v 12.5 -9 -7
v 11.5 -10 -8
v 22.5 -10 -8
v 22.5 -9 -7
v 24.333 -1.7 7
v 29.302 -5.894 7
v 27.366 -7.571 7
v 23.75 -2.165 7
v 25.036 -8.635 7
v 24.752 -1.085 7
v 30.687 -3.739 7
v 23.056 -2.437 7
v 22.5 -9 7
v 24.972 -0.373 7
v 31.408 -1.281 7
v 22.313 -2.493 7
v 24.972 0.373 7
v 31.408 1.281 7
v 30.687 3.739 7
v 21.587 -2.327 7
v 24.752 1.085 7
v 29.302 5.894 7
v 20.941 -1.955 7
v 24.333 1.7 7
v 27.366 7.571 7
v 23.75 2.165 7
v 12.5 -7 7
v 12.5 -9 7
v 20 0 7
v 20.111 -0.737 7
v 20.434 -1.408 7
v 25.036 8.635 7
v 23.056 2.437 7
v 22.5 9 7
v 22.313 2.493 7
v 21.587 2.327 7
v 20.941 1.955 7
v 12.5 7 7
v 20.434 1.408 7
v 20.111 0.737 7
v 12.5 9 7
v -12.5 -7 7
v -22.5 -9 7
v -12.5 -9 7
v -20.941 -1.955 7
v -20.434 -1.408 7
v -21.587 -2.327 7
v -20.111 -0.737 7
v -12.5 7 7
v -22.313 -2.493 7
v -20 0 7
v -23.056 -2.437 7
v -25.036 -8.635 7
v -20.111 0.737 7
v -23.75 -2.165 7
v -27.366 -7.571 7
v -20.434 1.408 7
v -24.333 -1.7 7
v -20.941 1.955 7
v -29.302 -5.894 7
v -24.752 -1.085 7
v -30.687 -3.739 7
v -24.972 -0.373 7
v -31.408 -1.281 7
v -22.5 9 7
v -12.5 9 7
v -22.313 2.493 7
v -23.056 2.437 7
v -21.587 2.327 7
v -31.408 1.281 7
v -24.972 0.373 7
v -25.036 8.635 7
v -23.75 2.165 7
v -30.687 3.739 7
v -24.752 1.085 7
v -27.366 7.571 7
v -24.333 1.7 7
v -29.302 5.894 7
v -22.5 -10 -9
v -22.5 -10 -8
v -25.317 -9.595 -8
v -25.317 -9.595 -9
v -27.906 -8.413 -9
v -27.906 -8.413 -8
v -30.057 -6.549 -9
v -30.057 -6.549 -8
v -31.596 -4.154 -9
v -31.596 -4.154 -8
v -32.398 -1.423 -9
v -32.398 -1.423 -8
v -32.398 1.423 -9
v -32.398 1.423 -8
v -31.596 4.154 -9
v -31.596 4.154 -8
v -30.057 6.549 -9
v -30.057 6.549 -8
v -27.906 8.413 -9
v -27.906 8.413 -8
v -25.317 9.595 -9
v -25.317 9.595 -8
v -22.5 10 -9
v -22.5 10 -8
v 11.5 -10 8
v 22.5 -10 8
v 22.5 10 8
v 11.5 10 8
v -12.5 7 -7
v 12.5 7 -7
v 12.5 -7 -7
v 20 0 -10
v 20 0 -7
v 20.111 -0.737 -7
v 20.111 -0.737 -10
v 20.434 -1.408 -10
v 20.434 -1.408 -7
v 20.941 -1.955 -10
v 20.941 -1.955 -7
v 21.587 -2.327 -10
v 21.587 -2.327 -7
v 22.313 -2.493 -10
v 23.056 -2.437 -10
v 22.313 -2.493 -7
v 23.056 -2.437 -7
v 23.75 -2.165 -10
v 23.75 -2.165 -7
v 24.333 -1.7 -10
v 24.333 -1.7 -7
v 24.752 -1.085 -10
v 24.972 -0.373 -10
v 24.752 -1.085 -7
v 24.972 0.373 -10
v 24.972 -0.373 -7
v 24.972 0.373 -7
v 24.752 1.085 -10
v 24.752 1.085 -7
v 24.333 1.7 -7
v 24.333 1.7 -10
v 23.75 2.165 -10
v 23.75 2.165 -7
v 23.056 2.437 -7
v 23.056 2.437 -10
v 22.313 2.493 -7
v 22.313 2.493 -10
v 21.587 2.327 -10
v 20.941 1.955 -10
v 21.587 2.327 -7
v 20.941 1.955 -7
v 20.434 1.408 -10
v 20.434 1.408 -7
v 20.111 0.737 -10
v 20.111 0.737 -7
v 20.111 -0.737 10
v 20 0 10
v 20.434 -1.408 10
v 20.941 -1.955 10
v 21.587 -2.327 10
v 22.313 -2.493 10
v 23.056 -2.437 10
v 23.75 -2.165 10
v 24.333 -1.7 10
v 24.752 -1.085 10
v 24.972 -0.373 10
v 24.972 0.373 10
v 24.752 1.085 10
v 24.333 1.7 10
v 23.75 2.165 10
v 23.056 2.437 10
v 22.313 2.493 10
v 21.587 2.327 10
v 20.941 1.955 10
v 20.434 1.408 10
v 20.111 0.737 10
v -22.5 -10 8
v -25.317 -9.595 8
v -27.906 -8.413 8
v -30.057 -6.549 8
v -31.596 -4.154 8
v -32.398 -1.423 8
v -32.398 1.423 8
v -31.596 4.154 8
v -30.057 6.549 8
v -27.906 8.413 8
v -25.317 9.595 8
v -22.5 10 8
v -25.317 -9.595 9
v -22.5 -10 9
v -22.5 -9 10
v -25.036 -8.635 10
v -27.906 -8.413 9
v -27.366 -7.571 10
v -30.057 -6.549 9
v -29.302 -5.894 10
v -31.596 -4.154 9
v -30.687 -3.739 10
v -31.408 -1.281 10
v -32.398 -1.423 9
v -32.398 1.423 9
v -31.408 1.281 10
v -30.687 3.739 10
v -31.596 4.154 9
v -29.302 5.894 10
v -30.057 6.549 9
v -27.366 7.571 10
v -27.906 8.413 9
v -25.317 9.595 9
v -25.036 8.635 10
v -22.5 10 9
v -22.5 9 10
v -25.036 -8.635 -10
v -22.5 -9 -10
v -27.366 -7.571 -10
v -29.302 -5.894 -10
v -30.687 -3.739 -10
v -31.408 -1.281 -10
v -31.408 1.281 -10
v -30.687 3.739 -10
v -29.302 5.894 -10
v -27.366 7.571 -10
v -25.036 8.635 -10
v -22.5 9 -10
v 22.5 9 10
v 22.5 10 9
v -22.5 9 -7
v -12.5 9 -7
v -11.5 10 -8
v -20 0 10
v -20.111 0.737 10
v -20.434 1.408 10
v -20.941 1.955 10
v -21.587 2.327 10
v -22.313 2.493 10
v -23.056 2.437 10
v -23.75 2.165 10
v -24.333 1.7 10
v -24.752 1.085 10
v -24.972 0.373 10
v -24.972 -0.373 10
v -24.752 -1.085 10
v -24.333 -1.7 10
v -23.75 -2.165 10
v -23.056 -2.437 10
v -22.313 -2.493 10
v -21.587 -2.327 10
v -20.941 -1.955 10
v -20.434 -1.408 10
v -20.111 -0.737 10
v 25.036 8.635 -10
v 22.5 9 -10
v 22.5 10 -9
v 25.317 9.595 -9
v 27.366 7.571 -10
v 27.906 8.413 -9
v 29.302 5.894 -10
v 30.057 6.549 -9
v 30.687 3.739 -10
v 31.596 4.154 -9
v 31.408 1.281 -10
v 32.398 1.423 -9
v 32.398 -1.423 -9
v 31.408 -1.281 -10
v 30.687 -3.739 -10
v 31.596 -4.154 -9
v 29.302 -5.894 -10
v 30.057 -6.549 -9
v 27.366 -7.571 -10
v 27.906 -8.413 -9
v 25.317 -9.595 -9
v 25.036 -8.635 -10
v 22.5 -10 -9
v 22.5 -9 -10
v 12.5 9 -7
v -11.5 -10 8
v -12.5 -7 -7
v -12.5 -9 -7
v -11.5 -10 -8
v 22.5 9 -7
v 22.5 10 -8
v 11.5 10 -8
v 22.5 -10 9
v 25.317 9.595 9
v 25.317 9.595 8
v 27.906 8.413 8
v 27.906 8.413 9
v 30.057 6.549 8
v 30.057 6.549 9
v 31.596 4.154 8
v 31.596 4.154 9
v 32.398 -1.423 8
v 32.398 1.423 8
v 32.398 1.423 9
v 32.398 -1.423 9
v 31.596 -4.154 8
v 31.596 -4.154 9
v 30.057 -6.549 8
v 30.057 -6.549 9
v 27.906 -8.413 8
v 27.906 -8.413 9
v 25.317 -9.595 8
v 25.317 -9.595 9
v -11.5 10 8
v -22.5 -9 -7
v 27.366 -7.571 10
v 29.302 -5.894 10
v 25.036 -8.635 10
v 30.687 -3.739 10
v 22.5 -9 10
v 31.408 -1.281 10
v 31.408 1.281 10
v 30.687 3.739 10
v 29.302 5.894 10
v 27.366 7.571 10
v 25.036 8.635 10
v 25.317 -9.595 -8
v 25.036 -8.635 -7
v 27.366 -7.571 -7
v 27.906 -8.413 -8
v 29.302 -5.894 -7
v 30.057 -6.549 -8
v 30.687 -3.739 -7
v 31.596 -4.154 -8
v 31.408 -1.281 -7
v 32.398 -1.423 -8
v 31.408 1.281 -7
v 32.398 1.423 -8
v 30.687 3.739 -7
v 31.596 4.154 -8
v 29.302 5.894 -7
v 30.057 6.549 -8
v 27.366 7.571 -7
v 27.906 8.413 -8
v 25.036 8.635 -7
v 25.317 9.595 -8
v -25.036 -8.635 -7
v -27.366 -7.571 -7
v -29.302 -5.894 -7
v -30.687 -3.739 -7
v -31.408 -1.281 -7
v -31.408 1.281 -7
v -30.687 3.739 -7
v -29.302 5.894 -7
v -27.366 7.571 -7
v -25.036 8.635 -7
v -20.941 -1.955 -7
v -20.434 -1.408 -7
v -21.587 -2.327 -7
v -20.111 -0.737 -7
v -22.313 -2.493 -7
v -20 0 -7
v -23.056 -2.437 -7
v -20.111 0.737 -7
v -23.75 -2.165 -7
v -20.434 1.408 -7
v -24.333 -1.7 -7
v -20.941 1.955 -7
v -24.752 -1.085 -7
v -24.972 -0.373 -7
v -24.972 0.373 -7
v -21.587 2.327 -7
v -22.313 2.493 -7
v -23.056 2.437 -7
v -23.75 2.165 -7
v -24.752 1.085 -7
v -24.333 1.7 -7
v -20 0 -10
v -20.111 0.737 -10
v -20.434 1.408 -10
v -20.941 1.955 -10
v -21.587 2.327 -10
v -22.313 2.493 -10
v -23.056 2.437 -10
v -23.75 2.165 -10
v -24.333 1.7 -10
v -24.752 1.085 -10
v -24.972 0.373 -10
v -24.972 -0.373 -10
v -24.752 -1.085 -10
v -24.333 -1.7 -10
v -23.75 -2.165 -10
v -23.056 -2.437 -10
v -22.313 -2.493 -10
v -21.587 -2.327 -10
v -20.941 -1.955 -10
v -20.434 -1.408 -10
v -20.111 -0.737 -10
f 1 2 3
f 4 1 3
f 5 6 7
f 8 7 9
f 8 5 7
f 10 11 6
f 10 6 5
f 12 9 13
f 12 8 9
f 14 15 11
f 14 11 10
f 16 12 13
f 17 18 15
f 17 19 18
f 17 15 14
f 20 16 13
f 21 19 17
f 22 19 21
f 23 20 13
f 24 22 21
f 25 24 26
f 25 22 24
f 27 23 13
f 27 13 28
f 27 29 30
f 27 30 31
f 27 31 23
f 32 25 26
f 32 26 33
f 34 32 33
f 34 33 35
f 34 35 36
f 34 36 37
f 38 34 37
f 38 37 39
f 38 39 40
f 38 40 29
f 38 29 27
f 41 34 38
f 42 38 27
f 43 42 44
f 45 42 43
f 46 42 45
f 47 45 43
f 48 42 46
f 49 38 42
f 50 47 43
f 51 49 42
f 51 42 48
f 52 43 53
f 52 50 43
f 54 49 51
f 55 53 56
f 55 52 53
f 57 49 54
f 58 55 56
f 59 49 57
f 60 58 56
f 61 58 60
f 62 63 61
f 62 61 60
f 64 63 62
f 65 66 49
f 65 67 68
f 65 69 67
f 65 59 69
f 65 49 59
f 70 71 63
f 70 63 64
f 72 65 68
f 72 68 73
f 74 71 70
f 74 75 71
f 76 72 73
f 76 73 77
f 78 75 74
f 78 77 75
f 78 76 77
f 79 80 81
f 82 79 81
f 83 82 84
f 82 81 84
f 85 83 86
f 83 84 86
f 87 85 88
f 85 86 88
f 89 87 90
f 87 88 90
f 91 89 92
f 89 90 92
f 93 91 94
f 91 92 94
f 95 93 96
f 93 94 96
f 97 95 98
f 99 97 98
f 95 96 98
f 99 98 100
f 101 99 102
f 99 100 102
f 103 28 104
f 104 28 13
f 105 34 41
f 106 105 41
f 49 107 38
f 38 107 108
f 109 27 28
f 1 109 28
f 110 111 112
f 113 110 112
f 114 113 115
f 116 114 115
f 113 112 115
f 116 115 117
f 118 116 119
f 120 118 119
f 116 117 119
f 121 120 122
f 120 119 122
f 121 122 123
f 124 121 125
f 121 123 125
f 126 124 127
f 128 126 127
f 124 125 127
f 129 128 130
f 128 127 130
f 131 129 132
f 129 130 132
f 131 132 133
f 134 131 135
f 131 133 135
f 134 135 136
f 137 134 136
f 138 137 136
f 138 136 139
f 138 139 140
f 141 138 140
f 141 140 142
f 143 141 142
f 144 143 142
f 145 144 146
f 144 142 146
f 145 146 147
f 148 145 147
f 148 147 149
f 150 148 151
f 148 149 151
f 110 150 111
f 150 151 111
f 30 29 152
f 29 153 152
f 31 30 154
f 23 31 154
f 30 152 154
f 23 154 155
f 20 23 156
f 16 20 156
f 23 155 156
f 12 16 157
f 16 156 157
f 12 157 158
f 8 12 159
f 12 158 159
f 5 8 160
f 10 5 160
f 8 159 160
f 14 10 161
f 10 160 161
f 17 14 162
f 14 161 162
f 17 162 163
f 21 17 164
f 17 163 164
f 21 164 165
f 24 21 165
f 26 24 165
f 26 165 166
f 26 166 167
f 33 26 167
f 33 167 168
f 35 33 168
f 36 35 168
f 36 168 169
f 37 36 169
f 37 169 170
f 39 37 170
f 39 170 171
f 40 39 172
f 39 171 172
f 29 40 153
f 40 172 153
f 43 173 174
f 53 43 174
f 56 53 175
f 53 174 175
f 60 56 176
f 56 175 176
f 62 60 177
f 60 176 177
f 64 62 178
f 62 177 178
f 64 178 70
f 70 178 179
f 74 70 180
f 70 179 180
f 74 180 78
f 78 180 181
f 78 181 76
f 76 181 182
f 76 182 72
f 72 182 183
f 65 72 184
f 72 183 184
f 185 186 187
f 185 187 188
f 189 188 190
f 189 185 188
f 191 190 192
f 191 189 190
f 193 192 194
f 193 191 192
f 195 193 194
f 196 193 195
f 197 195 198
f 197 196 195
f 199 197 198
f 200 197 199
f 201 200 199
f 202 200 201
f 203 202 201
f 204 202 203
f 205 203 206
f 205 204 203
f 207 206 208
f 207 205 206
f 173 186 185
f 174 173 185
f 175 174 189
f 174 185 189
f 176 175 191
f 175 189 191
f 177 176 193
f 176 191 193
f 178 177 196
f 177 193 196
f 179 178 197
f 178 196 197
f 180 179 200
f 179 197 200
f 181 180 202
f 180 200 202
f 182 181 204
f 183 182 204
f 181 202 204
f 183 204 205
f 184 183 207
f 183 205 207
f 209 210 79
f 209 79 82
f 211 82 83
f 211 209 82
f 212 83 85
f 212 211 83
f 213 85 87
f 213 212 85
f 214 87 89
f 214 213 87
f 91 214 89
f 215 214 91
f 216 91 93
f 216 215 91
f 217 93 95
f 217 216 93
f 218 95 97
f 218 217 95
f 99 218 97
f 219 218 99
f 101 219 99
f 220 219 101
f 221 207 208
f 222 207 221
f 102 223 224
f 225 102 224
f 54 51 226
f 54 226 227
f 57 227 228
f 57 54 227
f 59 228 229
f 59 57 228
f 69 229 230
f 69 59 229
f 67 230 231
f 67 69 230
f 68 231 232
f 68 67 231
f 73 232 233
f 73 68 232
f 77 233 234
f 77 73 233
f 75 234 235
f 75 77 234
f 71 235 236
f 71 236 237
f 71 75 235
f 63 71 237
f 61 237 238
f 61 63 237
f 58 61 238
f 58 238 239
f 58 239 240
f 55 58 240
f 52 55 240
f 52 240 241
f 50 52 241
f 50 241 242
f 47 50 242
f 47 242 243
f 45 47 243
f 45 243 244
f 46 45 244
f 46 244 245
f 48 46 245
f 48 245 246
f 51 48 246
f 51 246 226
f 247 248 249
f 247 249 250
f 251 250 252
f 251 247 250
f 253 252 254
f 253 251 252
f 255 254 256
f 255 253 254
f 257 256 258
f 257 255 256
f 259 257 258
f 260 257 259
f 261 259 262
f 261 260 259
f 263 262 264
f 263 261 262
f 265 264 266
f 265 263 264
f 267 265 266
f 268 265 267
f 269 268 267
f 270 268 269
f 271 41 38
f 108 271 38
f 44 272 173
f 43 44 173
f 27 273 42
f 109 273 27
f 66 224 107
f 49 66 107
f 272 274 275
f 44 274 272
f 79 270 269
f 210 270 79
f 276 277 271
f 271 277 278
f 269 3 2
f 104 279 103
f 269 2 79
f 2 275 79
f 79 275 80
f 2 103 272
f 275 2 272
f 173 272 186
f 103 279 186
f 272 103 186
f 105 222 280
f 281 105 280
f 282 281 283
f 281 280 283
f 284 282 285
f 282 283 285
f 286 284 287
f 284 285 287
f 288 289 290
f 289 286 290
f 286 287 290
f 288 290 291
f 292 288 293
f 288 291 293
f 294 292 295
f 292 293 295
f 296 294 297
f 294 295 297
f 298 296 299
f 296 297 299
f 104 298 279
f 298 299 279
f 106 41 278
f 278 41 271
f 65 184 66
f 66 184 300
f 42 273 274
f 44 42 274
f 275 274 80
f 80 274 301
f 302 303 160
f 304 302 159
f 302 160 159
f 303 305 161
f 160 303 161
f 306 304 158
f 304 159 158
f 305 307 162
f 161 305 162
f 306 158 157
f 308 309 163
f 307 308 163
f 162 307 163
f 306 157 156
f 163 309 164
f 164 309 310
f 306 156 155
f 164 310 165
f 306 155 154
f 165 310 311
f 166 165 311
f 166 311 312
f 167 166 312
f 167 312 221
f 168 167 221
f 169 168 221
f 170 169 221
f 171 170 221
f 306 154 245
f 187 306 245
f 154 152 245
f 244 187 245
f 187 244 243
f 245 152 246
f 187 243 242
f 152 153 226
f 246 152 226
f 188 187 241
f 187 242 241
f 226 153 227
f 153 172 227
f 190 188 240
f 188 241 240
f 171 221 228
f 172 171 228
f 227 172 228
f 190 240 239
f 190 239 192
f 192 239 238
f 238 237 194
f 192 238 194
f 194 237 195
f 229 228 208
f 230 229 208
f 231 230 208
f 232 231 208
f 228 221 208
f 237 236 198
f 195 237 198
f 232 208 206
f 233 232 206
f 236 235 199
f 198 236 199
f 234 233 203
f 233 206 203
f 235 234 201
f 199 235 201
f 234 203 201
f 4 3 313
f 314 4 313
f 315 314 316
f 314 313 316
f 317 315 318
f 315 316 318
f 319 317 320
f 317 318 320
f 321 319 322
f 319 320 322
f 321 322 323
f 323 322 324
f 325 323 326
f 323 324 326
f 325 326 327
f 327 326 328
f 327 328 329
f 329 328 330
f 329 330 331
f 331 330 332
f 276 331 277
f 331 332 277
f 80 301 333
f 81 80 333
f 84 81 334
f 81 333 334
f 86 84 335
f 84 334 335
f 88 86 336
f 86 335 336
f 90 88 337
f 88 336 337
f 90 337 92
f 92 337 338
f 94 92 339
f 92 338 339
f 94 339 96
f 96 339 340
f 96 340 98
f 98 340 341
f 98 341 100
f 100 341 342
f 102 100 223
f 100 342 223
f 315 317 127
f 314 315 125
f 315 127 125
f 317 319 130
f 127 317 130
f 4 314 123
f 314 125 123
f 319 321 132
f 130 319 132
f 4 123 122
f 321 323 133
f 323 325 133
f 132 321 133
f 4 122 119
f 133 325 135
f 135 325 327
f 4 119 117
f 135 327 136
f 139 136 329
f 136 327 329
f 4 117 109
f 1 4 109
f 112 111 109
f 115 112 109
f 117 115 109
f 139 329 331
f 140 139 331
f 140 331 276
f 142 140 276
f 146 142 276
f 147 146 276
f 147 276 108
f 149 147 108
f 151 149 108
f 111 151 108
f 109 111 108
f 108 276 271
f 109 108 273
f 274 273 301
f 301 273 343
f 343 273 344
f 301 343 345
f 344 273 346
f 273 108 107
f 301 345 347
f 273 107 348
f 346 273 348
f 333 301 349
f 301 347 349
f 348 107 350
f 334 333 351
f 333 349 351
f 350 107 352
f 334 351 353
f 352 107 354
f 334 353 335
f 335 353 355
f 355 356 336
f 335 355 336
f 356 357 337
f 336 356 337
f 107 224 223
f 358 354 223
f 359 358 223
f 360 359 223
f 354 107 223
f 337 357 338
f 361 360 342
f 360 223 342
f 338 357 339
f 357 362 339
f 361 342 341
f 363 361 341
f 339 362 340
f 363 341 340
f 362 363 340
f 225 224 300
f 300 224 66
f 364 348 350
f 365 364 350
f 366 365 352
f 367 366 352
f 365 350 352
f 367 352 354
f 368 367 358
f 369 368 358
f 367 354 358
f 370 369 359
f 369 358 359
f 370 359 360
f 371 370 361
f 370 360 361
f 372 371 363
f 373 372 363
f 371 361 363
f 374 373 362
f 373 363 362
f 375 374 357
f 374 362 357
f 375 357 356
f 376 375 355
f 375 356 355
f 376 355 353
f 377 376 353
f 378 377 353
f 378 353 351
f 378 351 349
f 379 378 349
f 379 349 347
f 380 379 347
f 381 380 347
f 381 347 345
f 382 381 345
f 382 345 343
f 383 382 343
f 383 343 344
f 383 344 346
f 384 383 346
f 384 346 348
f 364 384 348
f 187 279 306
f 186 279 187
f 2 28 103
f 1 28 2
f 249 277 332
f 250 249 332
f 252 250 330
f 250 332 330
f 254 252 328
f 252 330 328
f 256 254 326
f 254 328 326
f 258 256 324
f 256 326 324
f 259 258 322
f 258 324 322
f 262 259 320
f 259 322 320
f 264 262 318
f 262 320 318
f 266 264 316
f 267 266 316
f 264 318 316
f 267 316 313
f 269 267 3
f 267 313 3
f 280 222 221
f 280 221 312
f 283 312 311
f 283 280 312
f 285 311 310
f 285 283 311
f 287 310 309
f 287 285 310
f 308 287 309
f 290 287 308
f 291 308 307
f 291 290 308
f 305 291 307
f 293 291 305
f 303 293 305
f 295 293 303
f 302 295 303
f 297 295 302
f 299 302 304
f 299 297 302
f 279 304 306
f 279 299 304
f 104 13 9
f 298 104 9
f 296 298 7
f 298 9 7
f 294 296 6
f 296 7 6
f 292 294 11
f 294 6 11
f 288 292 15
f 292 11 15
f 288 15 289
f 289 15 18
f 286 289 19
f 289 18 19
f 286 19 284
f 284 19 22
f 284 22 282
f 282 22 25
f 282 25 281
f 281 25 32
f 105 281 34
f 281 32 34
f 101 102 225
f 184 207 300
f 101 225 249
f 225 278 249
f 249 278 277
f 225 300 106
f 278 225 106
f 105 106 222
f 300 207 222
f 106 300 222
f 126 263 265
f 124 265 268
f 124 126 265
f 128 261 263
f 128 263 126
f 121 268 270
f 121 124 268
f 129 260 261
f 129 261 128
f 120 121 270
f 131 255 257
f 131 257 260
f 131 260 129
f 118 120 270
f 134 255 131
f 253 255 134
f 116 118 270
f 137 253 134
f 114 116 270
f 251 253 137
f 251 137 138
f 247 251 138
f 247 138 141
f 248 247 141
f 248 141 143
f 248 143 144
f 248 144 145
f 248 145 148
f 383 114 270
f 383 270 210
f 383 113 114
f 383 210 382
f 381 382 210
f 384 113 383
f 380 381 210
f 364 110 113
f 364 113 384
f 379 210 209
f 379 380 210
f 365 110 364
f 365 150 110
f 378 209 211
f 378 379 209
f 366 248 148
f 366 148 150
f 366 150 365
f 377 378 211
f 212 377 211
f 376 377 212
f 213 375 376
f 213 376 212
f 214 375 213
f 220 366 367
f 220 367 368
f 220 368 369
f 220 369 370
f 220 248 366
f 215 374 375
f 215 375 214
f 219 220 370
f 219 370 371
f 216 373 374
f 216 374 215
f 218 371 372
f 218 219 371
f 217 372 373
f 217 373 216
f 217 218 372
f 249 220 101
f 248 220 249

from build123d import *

# Parameters (mm, degrees)
BOSS_EXTRUDE1_DEPTH = 10
CUT_EXTRUDE1_DEPTH  = 7
SKETCH3_R           = 2.5
CUT_EXTRUDE2_DEPTH  = 10
CHAMFER2_SIZE       = 1
CHAMFER3_SIZE       = 1
SHELL1_START        = -7
SHELL1_OUTLINE_W    = 25
SHELL1_OUTLINE_H    = 14
SHELL1_DEPTH        = 14
CHAMFER4_SIZE       = 1


# Read off the part's stored shape, not the designer's step: Shell1
with BuildPart() as part:
    # Sketch1 → Boss-Extrude1 (new, symmetric)
    with BuildSketch(Plane.XY):
        with BuildLine():
            Line((-22.5, 10), (22.5, 10))
            ThreePointArc((22.5, 10), (32.5, 0), (22.5, -10))
            Line((22.5, -10), (-22.5, -10))
            ThreePointArc((-22.5, -10), (-32.5, 0), (-22.5, 10))
        make_face()
    extrude(amount=BOSS_EXTRUDE1_DEPTH, both=True)

    # Sketch2 → Cut-Extrude1 (cut, symmetric)
    with BuildSketch(Plane.XY):
        with BuildLine():
            Line((-22.5, 10), (-12.5, 10))
            Line((-12.5, 10), (-12.5, -10))
            Line((-12.5, -10), (-22.5, -10))
            ThreePointArc((-22.5, -10), (-32.5, 0), (-22.5, 10))
        make_face()
        with BuildLine():
            Line((12.5, -10), (22.5, -10))
            ThreePointArc((22.5, -10), (32.5, 0), (22.5, 10))
            Line((22.5, 10), (12.5, 10))
            Line((12.5, 10), (12.5, -10))
        make_face()
    extrude(amount=CUT_EXTRUDE1_DEPTH, both=True, mode=Mode.SUBTRACT)

    # Sketch3 → Cut-Extrude2 (cut, symmetric)
    with BuildSketch(Plane.XY):
        with Locations((-22.5, 0)):
            Circle(SKETCH3_R)
        with Locations(Location((22.5, 0, 0), (0, 0, 180))):
            Circle(SKETCH3_R)
    extrude(amount=CUT_EXTRUDE2_DEPTH, both=True, mode=Mode.SUBTRACT)

    # Chamfer2
    chamfer2_edges = [part.edges().sort_by_distance(p)[0] for p in [
        (-32.5, 0, -7),
        (-17.5, 10, -7),
        (-17.5, -10, -7),
        (-32.5, 0, 7),
        (-17.5, -10, 7),
        (-17.5, 10, 7),
        (32.5, 0, -7),
        (17.5, -10, -7),
        (17.5, 10, -7),
        (32.5, 0, 7),
        (17.5, 10, 7),
        (17.5, -10, 7),
    ]]
    chamfer(chamfer2_edges, length=CHAMFER2_SIZE)

    # Chamfer3
    chamfer3_edges = [part.edges().sort_by_distance(p)[0] for p in [
        (32.5, 0, 10),
        (0, 10, 10),
        (-32.5, 0, 10),
        (0, 10, -10),
        (32.5, 0, -10),
        (0, -10, -10),
        (-32.5, 0, -10),
        (0, -10, 10),
    ]]
    chamfer(chamfer3_edges, length=CHAMFER3_SIZE)

    # Shell1 outline → Shell1 (cut)
    with BuildSketch(Plane.XY.offset(SHELL1_START)):
        Rectangle(SHELL1_OUTLINE_W, SHELL1_OUTLINE_H)
    extrude(amount=SHELL1_DEPTH, mode=Mode.SUBTRACT)

    # Chamfer4
    chamfer4_edges = [part.edges().sort_by_distance(p)[0] for p in [
        (12.5, -10, 0),
        (12.5, 10, 0),
        (-12.5, -10, 0),
        (-12.5, 10, 0),
    ]]
    chamfer(chamfer4_edges, length=CHAMFER4_SIZE)


solid = part.part
